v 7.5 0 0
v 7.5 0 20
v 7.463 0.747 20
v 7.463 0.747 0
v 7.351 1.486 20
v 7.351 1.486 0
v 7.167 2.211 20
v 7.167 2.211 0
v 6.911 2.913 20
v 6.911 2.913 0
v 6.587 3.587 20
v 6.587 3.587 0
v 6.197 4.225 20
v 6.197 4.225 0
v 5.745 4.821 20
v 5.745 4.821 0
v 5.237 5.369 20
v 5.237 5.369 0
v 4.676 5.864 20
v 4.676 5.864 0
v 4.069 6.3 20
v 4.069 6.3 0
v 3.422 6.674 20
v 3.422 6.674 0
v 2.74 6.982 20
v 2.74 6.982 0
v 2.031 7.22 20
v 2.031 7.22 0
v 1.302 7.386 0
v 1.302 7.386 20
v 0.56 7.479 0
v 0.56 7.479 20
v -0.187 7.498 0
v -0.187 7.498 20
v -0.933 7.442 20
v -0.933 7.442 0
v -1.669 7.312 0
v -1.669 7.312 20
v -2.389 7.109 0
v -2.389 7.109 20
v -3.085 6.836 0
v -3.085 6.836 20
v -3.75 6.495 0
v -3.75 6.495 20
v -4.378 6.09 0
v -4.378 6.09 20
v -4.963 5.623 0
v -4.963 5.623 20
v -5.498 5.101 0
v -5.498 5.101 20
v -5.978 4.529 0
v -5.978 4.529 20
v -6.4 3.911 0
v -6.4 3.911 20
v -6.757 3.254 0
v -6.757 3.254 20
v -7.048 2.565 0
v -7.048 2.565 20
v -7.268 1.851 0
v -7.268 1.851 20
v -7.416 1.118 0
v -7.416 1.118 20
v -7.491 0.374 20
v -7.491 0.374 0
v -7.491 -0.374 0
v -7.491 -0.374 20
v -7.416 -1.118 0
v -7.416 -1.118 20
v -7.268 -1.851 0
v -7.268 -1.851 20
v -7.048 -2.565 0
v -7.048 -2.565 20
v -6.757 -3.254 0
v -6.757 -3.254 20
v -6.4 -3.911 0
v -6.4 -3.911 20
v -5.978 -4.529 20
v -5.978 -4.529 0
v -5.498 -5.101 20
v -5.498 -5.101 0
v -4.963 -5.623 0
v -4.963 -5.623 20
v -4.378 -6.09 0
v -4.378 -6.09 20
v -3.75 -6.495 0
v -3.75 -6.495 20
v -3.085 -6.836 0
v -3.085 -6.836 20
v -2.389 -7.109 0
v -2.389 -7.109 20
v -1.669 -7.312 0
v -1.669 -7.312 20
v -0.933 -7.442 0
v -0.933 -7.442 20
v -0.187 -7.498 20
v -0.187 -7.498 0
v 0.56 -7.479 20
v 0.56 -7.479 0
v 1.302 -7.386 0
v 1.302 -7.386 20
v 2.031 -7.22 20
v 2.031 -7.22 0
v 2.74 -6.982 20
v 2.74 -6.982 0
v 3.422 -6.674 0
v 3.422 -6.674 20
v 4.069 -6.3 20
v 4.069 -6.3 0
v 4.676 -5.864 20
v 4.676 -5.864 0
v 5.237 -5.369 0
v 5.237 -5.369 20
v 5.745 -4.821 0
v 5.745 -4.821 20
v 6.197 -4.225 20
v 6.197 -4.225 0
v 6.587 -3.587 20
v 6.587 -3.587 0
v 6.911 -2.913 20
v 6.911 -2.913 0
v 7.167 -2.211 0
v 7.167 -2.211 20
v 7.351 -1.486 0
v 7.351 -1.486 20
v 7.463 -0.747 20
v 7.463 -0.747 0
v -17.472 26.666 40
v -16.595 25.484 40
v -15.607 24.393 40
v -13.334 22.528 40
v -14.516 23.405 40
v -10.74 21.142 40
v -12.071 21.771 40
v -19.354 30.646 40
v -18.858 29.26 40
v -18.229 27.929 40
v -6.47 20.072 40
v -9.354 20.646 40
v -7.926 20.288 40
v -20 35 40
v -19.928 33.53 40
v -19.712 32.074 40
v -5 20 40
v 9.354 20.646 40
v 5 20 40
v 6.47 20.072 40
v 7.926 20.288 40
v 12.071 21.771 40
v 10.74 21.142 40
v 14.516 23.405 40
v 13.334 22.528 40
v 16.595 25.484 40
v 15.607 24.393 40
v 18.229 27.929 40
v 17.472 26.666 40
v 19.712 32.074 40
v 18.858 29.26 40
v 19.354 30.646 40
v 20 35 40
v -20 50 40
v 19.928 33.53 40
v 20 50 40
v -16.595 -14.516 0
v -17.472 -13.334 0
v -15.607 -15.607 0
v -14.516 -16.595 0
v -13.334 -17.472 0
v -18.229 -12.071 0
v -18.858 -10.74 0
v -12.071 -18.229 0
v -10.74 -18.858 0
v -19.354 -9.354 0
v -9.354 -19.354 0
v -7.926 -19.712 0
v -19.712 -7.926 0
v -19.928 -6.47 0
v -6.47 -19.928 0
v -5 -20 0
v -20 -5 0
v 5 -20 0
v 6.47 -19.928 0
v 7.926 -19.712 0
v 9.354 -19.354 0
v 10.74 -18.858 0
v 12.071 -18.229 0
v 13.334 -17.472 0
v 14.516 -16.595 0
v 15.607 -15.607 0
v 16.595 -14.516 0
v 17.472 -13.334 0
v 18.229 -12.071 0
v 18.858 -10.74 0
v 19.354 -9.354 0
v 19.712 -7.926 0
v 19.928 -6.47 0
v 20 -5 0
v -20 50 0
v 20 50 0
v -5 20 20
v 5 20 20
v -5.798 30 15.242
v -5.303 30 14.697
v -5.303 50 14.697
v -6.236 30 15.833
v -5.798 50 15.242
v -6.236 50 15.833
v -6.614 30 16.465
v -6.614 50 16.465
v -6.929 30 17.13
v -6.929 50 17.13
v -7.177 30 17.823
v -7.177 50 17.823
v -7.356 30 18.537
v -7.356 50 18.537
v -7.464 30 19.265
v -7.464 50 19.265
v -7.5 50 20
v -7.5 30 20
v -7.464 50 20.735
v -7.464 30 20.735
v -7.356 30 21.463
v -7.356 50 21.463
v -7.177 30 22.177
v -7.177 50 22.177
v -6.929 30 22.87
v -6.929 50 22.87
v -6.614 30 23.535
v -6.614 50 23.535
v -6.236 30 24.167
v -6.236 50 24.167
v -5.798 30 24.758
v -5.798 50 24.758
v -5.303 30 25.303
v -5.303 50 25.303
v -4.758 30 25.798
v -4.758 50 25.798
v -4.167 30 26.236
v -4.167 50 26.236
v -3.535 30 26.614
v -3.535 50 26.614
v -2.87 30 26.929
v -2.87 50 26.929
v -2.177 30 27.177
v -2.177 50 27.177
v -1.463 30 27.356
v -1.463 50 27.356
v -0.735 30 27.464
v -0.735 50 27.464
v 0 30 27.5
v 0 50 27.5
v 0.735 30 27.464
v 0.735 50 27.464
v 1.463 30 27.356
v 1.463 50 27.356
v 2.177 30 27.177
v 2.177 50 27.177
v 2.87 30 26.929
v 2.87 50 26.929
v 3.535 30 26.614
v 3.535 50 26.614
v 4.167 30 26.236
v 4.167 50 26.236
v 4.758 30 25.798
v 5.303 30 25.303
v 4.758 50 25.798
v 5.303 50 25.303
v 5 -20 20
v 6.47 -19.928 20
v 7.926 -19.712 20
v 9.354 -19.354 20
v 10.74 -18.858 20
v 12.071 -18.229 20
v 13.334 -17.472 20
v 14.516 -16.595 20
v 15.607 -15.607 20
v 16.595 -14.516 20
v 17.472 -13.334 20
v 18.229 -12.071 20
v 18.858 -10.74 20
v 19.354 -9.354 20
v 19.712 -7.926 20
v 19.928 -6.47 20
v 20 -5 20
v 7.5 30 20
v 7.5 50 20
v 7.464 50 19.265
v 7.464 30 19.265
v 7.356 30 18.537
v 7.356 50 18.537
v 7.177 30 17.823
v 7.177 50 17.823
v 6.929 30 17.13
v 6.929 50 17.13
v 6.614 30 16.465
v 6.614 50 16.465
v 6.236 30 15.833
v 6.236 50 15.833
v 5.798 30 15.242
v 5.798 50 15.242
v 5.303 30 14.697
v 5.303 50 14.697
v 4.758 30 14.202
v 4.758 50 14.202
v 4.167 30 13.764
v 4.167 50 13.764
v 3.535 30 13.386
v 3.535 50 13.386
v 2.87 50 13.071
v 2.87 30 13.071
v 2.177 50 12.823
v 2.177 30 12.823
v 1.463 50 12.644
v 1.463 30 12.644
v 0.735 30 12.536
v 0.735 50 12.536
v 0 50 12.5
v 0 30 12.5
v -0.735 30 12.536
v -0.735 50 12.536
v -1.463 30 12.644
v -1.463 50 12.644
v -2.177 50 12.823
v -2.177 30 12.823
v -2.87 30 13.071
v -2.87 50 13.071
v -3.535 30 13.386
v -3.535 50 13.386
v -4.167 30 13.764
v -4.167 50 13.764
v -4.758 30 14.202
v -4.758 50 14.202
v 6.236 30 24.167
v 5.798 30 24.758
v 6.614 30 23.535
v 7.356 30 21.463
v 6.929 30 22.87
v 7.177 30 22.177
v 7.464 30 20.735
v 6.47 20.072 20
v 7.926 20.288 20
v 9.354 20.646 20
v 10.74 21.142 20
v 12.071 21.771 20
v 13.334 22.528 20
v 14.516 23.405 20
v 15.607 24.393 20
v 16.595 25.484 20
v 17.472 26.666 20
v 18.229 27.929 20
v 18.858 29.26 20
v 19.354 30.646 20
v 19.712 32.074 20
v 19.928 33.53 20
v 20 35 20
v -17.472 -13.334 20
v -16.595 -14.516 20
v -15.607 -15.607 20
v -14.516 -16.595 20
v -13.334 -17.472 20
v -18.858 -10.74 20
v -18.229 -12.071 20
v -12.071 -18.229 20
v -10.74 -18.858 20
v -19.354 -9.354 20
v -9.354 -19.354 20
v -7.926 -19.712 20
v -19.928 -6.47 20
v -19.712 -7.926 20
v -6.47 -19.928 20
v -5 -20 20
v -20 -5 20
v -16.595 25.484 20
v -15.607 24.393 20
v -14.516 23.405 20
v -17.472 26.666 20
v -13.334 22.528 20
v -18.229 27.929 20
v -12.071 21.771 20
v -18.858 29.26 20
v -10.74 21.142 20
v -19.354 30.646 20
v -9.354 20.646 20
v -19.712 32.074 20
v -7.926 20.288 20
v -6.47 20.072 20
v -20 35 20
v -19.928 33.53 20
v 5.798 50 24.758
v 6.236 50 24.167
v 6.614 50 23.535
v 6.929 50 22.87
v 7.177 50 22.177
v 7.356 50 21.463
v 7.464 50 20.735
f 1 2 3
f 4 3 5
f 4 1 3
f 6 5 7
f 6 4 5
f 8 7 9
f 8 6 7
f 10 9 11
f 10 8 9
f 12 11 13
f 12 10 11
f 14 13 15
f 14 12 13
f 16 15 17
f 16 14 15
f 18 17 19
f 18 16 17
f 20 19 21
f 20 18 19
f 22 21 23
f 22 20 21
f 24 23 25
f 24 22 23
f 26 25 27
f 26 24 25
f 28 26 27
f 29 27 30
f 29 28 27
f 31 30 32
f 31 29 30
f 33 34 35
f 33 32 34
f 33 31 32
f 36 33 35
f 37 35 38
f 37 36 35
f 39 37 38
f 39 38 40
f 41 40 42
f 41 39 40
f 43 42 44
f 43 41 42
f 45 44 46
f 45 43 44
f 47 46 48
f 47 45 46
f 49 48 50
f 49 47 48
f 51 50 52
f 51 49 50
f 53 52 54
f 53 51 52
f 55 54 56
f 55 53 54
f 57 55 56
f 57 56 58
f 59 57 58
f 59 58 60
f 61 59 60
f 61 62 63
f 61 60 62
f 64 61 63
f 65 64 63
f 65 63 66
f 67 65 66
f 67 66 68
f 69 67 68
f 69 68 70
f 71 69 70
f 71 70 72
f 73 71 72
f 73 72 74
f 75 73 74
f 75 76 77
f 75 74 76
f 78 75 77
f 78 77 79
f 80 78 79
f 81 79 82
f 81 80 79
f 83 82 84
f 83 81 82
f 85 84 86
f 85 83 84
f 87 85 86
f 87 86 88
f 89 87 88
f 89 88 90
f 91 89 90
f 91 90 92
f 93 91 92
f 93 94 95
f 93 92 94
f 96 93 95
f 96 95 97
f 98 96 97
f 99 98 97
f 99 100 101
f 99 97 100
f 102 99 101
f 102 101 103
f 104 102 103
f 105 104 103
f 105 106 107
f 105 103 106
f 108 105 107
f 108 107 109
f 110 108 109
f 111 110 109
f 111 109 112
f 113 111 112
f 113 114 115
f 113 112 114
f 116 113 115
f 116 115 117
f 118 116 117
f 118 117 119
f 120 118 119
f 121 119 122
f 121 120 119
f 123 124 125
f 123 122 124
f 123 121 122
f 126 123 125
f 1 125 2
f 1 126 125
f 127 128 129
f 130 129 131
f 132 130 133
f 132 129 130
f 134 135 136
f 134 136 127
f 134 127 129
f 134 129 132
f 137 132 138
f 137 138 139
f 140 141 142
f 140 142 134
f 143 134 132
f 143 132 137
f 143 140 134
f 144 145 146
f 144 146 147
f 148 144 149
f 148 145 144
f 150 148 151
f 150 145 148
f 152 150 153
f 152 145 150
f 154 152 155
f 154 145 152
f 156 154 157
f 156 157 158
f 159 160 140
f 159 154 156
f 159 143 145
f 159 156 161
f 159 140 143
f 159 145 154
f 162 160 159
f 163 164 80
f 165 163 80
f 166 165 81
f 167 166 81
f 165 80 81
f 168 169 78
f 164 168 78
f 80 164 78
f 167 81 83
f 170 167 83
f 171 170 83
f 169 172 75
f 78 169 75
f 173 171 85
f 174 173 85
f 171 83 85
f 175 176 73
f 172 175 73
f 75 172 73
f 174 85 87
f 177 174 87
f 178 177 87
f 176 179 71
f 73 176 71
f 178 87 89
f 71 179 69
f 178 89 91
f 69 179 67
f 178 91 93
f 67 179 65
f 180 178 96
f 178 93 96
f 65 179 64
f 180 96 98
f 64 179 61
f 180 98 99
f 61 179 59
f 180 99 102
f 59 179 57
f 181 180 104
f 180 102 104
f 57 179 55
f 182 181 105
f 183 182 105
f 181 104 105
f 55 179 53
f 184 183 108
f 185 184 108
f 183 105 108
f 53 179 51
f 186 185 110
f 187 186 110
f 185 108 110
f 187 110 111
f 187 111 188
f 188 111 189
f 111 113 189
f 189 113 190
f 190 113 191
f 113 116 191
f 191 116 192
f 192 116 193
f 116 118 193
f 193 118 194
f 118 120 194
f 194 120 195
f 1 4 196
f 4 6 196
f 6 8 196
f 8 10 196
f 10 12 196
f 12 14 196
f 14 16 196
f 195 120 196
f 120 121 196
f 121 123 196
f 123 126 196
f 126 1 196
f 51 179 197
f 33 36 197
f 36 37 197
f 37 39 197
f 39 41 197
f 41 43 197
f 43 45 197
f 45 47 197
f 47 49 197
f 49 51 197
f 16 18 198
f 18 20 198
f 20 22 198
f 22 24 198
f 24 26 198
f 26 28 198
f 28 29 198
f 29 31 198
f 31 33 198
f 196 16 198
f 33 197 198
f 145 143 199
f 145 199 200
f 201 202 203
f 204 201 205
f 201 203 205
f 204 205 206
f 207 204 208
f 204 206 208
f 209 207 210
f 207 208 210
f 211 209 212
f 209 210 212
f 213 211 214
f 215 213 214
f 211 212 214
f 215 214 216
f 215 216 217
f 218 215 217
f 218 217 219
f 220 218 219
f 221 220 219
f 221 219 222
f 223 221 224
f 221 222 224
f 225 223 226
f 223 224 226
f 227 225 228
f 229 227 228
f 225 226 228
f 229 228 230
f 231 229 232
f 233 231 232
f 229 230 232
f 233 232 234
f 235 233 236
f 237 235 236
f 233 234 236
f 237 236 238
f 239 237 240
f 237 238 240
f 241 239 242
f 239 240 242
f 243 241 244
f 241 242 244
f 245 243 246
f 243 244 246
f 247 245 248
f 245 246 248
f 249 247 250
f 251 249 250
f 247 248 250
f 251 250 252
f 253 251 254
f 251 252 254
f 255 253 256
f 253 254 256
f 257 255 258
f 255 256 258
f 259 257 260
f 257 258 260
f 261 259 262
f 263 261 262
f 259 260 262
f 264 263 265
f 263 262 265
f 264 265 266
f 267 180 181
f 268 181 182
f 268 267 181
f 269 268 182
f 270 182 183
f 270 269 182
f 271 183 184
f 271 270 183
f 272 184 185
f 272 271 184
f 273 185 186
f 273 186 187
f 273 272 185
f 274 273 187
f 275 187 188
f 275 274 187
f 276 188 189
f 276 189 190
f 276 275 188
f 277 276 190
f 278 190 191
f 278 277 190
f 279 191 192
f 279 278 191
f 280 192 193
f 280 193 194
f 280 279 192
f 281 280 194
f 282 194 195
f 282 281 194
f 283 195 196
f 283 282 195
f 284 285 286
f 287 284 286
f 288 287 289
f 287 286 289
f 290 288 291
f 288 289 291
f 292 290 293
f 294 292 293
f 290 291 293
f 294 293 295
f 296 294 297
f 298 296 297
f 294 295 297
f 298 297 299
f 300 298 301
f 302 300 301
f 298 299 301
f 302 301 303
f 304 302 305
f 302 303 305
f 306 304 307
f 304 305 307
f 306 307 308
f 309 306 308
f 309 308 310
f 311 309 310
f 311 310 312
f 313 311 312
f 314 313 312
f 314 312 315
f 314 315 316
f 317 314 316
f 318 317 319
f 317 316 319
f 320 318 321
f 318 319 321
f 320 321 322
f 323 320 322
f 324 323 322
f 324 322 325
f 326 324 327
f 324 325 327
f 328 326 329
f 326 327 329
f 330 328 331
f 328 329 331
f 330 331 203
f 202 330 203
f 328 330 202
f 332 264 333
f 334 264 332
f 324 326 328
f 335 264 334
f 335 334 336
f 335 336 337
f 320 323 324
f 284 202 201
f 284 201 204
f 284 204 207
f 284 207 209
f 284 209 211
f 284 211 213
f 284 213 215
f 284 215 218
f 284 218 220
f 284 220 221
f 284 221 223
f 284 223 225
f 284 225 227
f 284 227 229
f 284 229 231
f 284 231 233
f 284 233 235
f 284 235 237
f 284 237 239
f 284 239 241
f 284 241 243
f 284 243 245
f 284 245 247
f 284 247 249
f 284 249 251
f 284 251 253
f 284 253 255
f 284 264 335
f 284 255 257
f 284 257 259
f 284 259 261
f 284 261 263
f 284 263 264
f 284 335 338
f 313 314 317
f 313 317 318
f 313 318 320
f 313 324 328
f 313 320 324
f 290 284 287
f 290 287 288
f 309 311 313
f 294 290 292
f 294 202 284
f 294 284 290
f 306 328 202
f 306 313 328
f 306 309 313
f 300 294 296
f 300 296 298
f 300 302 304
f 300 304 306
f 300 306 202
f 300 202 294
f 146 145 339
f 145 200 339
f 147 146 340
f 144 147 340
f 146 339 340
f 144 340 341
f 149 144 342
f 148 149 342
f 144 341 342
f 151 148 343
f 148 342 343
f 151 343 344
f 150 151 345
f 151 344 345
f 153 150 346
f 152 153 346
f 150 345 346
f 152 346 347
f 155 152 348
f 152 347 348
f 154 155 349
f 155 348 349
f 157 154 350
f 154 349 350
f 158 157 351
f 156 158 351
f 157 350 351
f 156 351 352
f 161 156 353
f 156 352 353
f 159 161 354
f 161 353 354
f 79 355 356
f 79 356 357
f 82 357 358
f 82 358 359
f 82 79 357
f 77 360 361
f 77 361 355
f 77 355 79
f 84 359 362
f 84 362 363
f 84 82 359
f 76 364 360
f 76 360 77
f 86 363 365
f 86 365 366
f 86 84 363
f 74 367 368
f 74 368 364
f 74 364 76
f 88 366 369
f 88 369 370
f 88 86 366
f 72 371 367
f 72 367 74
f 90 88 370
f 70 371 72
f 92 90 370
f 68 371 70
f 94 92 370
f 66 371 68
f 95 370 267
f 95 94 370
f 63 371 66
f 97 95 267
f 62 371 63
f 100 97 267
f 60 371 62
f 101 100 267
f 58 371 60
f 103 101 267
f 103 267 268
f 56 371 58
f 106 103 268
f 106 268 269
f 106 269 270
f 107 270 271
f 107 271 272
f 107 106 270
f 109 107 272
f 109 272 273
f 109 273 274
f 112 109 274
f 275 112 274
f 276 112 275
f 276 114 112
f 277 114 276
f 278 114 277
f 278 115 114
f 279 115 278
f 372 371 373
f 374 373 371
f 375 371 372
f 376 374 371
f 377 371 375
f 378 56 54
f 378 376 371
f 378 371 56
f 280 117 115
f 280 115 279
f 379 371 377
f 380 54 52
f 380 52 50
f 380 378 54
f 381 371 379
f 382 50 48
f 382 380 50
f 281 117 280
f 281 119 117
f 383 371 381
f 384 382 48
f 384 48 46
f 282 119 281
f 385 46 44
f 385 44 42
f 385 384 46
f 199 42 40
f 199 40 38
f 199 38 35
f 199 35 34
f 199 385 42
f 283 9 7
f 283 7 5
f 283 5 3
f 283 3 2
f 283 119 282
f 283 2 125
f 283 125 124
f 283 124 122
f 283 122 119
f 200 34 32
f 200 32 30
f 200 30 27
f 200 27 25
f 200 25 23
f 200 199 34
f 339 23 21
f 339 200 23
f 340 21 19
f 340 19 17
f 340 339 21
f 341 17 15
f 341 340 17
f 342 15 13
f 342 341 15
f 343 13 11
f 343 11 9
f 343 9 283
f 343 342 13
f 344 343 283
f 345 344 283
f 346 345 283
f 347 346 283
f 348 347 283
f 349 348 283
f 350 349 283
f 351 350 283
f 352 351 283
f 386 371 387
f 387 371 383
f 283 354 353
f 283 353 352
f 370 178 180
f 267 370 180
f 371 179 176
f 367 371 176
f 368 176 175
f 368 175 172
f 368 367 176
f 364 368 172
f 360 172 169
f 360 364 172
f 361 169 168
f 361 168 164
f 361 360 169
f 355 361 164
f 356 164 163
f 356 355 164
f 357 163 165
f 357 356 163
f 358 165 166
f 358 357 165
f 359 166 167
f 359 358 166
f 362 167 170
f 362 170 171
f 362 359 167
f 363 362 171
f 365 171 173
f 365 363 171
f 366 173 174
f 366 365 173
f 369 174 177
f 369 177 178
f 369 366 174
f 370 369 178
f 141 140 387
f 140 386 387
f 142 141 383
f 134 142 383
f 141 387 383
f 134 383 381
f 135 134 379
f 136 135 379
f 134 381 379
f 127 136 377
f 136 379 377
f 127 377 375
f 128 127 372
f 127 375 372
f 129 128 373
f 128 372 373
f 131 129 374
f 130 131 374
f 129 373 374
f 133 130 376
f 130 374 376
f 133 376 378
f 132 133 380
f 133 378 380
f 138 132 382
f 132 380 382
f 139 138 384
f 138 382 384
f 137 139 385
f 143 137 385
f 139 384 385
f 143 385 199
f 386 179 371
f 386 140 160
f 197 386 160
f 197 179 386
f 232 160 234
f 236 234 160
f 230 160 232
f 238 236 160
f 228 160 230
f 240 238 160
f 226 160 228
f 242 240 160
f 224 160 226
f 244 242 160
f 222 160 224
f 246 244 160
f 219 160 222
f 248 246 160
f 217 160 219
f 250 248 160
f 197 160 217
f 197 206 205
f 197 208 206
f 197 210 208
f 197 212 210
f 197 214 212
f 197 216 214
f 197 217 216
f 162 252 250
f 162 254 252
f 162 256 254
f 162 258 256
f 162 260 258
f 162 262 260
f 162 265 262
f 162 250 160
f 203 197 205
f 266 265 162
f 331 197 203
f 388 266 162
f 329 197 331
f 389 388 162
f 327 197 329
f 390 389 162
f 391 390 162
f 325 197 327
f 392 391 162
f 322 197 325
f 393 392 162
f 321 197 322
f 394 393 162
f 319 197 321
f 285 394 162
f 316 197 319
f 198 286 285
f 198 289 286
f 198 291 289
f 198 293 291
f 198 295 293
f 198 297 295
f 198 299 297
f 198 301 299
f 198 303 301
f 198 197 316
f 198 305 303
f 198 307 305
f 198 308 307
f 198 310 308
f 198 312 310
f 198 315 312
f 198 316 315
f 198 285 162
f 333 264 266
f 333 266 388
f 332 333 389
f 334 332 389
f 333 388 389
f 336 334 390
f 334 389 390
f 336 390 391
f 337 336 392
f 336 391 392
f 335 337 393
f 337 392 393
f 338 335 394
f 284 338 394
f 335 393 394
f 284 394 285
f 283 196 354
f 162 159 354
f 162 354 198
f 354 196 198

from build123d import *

# Parameters (mm, degrees)
SKETCH1_W           = 40
SKETCH1_H           = 70
SKETCH1_R           = 7.5
BOSS_EXTRUDE1_DEPTH = 40
CUT_EXTRUDE1_DEPTH  = 20
SKETCH3_W           = 40
SKETCH3_H           = 40
CUT_EXTRUDE2_DEPTH  = 20
FILLET1_R           = 15


with BuildPart() as part:
    # Sketch1 → Boss-Extrude1 (new body)
    with BuildSketch(Plane.XY):
        with Locations((0, 15)):
            Rectangle(SKETCH1_W, SKETCH1_H)
        Circle(SKETCH1_R, mode=Mode.SUBTRACT)
    extrude(amount=BOSS_EXTRUDE1_DEPTH)

    # Sketch2 → Cut-Extrude1 (cut)
    with BuildSketch(Plane(origin=(0, 50, 0), x_dir=(1, 0, 0), z_dir=(0, 1, 0))):
        with BuildLine():
            ThreePointArc((7.5, -20), (2.870125743, -13.070903506), (-5.303300859, -14.696699141))
            Line((-5.303300859, -14.696699141), (5.303300859, -25.303300859))
            ThreePointArc((5.303300859, -25.303300859), (6.929096494, -22.870125743), (7.5, -20))
        make_face()
        with BuildLine():
            Line((5.303300859, -25.303300859), (-5.303300859, -14.696699141))
            ThreePointArc((-5.303300859, -14.696699141), (-5.303300859, -25.303300859), (5.303300859, -25.303300859))
        make_face()
    extrude(amount=-CUT_EXTRUDE1_DEPTH, mode=Mode.SUBTRACT)

    # Sketch3 → Cut-Extrude2 (cut)
    with BuildSketch(Plane.XY.offset(40)):
        Rectangle(SKETCH3_W, SKETCH3_H)
    extrude(amount=-CUT_EXTRUDE2_DEPTH, mode=Mode.SUBTRACT)

    # Fillet1
    fillet1_edges = [part.edges().sort_by_distance(p)[0] for p in [
        (20, -20, 10),
        (-20, -20, 10),
        (-20, 20, 30),
        (20, 20, 30),
    ]]
    fillet(fillet1_edges, radius=FILLET1_R)


solid = part.part
